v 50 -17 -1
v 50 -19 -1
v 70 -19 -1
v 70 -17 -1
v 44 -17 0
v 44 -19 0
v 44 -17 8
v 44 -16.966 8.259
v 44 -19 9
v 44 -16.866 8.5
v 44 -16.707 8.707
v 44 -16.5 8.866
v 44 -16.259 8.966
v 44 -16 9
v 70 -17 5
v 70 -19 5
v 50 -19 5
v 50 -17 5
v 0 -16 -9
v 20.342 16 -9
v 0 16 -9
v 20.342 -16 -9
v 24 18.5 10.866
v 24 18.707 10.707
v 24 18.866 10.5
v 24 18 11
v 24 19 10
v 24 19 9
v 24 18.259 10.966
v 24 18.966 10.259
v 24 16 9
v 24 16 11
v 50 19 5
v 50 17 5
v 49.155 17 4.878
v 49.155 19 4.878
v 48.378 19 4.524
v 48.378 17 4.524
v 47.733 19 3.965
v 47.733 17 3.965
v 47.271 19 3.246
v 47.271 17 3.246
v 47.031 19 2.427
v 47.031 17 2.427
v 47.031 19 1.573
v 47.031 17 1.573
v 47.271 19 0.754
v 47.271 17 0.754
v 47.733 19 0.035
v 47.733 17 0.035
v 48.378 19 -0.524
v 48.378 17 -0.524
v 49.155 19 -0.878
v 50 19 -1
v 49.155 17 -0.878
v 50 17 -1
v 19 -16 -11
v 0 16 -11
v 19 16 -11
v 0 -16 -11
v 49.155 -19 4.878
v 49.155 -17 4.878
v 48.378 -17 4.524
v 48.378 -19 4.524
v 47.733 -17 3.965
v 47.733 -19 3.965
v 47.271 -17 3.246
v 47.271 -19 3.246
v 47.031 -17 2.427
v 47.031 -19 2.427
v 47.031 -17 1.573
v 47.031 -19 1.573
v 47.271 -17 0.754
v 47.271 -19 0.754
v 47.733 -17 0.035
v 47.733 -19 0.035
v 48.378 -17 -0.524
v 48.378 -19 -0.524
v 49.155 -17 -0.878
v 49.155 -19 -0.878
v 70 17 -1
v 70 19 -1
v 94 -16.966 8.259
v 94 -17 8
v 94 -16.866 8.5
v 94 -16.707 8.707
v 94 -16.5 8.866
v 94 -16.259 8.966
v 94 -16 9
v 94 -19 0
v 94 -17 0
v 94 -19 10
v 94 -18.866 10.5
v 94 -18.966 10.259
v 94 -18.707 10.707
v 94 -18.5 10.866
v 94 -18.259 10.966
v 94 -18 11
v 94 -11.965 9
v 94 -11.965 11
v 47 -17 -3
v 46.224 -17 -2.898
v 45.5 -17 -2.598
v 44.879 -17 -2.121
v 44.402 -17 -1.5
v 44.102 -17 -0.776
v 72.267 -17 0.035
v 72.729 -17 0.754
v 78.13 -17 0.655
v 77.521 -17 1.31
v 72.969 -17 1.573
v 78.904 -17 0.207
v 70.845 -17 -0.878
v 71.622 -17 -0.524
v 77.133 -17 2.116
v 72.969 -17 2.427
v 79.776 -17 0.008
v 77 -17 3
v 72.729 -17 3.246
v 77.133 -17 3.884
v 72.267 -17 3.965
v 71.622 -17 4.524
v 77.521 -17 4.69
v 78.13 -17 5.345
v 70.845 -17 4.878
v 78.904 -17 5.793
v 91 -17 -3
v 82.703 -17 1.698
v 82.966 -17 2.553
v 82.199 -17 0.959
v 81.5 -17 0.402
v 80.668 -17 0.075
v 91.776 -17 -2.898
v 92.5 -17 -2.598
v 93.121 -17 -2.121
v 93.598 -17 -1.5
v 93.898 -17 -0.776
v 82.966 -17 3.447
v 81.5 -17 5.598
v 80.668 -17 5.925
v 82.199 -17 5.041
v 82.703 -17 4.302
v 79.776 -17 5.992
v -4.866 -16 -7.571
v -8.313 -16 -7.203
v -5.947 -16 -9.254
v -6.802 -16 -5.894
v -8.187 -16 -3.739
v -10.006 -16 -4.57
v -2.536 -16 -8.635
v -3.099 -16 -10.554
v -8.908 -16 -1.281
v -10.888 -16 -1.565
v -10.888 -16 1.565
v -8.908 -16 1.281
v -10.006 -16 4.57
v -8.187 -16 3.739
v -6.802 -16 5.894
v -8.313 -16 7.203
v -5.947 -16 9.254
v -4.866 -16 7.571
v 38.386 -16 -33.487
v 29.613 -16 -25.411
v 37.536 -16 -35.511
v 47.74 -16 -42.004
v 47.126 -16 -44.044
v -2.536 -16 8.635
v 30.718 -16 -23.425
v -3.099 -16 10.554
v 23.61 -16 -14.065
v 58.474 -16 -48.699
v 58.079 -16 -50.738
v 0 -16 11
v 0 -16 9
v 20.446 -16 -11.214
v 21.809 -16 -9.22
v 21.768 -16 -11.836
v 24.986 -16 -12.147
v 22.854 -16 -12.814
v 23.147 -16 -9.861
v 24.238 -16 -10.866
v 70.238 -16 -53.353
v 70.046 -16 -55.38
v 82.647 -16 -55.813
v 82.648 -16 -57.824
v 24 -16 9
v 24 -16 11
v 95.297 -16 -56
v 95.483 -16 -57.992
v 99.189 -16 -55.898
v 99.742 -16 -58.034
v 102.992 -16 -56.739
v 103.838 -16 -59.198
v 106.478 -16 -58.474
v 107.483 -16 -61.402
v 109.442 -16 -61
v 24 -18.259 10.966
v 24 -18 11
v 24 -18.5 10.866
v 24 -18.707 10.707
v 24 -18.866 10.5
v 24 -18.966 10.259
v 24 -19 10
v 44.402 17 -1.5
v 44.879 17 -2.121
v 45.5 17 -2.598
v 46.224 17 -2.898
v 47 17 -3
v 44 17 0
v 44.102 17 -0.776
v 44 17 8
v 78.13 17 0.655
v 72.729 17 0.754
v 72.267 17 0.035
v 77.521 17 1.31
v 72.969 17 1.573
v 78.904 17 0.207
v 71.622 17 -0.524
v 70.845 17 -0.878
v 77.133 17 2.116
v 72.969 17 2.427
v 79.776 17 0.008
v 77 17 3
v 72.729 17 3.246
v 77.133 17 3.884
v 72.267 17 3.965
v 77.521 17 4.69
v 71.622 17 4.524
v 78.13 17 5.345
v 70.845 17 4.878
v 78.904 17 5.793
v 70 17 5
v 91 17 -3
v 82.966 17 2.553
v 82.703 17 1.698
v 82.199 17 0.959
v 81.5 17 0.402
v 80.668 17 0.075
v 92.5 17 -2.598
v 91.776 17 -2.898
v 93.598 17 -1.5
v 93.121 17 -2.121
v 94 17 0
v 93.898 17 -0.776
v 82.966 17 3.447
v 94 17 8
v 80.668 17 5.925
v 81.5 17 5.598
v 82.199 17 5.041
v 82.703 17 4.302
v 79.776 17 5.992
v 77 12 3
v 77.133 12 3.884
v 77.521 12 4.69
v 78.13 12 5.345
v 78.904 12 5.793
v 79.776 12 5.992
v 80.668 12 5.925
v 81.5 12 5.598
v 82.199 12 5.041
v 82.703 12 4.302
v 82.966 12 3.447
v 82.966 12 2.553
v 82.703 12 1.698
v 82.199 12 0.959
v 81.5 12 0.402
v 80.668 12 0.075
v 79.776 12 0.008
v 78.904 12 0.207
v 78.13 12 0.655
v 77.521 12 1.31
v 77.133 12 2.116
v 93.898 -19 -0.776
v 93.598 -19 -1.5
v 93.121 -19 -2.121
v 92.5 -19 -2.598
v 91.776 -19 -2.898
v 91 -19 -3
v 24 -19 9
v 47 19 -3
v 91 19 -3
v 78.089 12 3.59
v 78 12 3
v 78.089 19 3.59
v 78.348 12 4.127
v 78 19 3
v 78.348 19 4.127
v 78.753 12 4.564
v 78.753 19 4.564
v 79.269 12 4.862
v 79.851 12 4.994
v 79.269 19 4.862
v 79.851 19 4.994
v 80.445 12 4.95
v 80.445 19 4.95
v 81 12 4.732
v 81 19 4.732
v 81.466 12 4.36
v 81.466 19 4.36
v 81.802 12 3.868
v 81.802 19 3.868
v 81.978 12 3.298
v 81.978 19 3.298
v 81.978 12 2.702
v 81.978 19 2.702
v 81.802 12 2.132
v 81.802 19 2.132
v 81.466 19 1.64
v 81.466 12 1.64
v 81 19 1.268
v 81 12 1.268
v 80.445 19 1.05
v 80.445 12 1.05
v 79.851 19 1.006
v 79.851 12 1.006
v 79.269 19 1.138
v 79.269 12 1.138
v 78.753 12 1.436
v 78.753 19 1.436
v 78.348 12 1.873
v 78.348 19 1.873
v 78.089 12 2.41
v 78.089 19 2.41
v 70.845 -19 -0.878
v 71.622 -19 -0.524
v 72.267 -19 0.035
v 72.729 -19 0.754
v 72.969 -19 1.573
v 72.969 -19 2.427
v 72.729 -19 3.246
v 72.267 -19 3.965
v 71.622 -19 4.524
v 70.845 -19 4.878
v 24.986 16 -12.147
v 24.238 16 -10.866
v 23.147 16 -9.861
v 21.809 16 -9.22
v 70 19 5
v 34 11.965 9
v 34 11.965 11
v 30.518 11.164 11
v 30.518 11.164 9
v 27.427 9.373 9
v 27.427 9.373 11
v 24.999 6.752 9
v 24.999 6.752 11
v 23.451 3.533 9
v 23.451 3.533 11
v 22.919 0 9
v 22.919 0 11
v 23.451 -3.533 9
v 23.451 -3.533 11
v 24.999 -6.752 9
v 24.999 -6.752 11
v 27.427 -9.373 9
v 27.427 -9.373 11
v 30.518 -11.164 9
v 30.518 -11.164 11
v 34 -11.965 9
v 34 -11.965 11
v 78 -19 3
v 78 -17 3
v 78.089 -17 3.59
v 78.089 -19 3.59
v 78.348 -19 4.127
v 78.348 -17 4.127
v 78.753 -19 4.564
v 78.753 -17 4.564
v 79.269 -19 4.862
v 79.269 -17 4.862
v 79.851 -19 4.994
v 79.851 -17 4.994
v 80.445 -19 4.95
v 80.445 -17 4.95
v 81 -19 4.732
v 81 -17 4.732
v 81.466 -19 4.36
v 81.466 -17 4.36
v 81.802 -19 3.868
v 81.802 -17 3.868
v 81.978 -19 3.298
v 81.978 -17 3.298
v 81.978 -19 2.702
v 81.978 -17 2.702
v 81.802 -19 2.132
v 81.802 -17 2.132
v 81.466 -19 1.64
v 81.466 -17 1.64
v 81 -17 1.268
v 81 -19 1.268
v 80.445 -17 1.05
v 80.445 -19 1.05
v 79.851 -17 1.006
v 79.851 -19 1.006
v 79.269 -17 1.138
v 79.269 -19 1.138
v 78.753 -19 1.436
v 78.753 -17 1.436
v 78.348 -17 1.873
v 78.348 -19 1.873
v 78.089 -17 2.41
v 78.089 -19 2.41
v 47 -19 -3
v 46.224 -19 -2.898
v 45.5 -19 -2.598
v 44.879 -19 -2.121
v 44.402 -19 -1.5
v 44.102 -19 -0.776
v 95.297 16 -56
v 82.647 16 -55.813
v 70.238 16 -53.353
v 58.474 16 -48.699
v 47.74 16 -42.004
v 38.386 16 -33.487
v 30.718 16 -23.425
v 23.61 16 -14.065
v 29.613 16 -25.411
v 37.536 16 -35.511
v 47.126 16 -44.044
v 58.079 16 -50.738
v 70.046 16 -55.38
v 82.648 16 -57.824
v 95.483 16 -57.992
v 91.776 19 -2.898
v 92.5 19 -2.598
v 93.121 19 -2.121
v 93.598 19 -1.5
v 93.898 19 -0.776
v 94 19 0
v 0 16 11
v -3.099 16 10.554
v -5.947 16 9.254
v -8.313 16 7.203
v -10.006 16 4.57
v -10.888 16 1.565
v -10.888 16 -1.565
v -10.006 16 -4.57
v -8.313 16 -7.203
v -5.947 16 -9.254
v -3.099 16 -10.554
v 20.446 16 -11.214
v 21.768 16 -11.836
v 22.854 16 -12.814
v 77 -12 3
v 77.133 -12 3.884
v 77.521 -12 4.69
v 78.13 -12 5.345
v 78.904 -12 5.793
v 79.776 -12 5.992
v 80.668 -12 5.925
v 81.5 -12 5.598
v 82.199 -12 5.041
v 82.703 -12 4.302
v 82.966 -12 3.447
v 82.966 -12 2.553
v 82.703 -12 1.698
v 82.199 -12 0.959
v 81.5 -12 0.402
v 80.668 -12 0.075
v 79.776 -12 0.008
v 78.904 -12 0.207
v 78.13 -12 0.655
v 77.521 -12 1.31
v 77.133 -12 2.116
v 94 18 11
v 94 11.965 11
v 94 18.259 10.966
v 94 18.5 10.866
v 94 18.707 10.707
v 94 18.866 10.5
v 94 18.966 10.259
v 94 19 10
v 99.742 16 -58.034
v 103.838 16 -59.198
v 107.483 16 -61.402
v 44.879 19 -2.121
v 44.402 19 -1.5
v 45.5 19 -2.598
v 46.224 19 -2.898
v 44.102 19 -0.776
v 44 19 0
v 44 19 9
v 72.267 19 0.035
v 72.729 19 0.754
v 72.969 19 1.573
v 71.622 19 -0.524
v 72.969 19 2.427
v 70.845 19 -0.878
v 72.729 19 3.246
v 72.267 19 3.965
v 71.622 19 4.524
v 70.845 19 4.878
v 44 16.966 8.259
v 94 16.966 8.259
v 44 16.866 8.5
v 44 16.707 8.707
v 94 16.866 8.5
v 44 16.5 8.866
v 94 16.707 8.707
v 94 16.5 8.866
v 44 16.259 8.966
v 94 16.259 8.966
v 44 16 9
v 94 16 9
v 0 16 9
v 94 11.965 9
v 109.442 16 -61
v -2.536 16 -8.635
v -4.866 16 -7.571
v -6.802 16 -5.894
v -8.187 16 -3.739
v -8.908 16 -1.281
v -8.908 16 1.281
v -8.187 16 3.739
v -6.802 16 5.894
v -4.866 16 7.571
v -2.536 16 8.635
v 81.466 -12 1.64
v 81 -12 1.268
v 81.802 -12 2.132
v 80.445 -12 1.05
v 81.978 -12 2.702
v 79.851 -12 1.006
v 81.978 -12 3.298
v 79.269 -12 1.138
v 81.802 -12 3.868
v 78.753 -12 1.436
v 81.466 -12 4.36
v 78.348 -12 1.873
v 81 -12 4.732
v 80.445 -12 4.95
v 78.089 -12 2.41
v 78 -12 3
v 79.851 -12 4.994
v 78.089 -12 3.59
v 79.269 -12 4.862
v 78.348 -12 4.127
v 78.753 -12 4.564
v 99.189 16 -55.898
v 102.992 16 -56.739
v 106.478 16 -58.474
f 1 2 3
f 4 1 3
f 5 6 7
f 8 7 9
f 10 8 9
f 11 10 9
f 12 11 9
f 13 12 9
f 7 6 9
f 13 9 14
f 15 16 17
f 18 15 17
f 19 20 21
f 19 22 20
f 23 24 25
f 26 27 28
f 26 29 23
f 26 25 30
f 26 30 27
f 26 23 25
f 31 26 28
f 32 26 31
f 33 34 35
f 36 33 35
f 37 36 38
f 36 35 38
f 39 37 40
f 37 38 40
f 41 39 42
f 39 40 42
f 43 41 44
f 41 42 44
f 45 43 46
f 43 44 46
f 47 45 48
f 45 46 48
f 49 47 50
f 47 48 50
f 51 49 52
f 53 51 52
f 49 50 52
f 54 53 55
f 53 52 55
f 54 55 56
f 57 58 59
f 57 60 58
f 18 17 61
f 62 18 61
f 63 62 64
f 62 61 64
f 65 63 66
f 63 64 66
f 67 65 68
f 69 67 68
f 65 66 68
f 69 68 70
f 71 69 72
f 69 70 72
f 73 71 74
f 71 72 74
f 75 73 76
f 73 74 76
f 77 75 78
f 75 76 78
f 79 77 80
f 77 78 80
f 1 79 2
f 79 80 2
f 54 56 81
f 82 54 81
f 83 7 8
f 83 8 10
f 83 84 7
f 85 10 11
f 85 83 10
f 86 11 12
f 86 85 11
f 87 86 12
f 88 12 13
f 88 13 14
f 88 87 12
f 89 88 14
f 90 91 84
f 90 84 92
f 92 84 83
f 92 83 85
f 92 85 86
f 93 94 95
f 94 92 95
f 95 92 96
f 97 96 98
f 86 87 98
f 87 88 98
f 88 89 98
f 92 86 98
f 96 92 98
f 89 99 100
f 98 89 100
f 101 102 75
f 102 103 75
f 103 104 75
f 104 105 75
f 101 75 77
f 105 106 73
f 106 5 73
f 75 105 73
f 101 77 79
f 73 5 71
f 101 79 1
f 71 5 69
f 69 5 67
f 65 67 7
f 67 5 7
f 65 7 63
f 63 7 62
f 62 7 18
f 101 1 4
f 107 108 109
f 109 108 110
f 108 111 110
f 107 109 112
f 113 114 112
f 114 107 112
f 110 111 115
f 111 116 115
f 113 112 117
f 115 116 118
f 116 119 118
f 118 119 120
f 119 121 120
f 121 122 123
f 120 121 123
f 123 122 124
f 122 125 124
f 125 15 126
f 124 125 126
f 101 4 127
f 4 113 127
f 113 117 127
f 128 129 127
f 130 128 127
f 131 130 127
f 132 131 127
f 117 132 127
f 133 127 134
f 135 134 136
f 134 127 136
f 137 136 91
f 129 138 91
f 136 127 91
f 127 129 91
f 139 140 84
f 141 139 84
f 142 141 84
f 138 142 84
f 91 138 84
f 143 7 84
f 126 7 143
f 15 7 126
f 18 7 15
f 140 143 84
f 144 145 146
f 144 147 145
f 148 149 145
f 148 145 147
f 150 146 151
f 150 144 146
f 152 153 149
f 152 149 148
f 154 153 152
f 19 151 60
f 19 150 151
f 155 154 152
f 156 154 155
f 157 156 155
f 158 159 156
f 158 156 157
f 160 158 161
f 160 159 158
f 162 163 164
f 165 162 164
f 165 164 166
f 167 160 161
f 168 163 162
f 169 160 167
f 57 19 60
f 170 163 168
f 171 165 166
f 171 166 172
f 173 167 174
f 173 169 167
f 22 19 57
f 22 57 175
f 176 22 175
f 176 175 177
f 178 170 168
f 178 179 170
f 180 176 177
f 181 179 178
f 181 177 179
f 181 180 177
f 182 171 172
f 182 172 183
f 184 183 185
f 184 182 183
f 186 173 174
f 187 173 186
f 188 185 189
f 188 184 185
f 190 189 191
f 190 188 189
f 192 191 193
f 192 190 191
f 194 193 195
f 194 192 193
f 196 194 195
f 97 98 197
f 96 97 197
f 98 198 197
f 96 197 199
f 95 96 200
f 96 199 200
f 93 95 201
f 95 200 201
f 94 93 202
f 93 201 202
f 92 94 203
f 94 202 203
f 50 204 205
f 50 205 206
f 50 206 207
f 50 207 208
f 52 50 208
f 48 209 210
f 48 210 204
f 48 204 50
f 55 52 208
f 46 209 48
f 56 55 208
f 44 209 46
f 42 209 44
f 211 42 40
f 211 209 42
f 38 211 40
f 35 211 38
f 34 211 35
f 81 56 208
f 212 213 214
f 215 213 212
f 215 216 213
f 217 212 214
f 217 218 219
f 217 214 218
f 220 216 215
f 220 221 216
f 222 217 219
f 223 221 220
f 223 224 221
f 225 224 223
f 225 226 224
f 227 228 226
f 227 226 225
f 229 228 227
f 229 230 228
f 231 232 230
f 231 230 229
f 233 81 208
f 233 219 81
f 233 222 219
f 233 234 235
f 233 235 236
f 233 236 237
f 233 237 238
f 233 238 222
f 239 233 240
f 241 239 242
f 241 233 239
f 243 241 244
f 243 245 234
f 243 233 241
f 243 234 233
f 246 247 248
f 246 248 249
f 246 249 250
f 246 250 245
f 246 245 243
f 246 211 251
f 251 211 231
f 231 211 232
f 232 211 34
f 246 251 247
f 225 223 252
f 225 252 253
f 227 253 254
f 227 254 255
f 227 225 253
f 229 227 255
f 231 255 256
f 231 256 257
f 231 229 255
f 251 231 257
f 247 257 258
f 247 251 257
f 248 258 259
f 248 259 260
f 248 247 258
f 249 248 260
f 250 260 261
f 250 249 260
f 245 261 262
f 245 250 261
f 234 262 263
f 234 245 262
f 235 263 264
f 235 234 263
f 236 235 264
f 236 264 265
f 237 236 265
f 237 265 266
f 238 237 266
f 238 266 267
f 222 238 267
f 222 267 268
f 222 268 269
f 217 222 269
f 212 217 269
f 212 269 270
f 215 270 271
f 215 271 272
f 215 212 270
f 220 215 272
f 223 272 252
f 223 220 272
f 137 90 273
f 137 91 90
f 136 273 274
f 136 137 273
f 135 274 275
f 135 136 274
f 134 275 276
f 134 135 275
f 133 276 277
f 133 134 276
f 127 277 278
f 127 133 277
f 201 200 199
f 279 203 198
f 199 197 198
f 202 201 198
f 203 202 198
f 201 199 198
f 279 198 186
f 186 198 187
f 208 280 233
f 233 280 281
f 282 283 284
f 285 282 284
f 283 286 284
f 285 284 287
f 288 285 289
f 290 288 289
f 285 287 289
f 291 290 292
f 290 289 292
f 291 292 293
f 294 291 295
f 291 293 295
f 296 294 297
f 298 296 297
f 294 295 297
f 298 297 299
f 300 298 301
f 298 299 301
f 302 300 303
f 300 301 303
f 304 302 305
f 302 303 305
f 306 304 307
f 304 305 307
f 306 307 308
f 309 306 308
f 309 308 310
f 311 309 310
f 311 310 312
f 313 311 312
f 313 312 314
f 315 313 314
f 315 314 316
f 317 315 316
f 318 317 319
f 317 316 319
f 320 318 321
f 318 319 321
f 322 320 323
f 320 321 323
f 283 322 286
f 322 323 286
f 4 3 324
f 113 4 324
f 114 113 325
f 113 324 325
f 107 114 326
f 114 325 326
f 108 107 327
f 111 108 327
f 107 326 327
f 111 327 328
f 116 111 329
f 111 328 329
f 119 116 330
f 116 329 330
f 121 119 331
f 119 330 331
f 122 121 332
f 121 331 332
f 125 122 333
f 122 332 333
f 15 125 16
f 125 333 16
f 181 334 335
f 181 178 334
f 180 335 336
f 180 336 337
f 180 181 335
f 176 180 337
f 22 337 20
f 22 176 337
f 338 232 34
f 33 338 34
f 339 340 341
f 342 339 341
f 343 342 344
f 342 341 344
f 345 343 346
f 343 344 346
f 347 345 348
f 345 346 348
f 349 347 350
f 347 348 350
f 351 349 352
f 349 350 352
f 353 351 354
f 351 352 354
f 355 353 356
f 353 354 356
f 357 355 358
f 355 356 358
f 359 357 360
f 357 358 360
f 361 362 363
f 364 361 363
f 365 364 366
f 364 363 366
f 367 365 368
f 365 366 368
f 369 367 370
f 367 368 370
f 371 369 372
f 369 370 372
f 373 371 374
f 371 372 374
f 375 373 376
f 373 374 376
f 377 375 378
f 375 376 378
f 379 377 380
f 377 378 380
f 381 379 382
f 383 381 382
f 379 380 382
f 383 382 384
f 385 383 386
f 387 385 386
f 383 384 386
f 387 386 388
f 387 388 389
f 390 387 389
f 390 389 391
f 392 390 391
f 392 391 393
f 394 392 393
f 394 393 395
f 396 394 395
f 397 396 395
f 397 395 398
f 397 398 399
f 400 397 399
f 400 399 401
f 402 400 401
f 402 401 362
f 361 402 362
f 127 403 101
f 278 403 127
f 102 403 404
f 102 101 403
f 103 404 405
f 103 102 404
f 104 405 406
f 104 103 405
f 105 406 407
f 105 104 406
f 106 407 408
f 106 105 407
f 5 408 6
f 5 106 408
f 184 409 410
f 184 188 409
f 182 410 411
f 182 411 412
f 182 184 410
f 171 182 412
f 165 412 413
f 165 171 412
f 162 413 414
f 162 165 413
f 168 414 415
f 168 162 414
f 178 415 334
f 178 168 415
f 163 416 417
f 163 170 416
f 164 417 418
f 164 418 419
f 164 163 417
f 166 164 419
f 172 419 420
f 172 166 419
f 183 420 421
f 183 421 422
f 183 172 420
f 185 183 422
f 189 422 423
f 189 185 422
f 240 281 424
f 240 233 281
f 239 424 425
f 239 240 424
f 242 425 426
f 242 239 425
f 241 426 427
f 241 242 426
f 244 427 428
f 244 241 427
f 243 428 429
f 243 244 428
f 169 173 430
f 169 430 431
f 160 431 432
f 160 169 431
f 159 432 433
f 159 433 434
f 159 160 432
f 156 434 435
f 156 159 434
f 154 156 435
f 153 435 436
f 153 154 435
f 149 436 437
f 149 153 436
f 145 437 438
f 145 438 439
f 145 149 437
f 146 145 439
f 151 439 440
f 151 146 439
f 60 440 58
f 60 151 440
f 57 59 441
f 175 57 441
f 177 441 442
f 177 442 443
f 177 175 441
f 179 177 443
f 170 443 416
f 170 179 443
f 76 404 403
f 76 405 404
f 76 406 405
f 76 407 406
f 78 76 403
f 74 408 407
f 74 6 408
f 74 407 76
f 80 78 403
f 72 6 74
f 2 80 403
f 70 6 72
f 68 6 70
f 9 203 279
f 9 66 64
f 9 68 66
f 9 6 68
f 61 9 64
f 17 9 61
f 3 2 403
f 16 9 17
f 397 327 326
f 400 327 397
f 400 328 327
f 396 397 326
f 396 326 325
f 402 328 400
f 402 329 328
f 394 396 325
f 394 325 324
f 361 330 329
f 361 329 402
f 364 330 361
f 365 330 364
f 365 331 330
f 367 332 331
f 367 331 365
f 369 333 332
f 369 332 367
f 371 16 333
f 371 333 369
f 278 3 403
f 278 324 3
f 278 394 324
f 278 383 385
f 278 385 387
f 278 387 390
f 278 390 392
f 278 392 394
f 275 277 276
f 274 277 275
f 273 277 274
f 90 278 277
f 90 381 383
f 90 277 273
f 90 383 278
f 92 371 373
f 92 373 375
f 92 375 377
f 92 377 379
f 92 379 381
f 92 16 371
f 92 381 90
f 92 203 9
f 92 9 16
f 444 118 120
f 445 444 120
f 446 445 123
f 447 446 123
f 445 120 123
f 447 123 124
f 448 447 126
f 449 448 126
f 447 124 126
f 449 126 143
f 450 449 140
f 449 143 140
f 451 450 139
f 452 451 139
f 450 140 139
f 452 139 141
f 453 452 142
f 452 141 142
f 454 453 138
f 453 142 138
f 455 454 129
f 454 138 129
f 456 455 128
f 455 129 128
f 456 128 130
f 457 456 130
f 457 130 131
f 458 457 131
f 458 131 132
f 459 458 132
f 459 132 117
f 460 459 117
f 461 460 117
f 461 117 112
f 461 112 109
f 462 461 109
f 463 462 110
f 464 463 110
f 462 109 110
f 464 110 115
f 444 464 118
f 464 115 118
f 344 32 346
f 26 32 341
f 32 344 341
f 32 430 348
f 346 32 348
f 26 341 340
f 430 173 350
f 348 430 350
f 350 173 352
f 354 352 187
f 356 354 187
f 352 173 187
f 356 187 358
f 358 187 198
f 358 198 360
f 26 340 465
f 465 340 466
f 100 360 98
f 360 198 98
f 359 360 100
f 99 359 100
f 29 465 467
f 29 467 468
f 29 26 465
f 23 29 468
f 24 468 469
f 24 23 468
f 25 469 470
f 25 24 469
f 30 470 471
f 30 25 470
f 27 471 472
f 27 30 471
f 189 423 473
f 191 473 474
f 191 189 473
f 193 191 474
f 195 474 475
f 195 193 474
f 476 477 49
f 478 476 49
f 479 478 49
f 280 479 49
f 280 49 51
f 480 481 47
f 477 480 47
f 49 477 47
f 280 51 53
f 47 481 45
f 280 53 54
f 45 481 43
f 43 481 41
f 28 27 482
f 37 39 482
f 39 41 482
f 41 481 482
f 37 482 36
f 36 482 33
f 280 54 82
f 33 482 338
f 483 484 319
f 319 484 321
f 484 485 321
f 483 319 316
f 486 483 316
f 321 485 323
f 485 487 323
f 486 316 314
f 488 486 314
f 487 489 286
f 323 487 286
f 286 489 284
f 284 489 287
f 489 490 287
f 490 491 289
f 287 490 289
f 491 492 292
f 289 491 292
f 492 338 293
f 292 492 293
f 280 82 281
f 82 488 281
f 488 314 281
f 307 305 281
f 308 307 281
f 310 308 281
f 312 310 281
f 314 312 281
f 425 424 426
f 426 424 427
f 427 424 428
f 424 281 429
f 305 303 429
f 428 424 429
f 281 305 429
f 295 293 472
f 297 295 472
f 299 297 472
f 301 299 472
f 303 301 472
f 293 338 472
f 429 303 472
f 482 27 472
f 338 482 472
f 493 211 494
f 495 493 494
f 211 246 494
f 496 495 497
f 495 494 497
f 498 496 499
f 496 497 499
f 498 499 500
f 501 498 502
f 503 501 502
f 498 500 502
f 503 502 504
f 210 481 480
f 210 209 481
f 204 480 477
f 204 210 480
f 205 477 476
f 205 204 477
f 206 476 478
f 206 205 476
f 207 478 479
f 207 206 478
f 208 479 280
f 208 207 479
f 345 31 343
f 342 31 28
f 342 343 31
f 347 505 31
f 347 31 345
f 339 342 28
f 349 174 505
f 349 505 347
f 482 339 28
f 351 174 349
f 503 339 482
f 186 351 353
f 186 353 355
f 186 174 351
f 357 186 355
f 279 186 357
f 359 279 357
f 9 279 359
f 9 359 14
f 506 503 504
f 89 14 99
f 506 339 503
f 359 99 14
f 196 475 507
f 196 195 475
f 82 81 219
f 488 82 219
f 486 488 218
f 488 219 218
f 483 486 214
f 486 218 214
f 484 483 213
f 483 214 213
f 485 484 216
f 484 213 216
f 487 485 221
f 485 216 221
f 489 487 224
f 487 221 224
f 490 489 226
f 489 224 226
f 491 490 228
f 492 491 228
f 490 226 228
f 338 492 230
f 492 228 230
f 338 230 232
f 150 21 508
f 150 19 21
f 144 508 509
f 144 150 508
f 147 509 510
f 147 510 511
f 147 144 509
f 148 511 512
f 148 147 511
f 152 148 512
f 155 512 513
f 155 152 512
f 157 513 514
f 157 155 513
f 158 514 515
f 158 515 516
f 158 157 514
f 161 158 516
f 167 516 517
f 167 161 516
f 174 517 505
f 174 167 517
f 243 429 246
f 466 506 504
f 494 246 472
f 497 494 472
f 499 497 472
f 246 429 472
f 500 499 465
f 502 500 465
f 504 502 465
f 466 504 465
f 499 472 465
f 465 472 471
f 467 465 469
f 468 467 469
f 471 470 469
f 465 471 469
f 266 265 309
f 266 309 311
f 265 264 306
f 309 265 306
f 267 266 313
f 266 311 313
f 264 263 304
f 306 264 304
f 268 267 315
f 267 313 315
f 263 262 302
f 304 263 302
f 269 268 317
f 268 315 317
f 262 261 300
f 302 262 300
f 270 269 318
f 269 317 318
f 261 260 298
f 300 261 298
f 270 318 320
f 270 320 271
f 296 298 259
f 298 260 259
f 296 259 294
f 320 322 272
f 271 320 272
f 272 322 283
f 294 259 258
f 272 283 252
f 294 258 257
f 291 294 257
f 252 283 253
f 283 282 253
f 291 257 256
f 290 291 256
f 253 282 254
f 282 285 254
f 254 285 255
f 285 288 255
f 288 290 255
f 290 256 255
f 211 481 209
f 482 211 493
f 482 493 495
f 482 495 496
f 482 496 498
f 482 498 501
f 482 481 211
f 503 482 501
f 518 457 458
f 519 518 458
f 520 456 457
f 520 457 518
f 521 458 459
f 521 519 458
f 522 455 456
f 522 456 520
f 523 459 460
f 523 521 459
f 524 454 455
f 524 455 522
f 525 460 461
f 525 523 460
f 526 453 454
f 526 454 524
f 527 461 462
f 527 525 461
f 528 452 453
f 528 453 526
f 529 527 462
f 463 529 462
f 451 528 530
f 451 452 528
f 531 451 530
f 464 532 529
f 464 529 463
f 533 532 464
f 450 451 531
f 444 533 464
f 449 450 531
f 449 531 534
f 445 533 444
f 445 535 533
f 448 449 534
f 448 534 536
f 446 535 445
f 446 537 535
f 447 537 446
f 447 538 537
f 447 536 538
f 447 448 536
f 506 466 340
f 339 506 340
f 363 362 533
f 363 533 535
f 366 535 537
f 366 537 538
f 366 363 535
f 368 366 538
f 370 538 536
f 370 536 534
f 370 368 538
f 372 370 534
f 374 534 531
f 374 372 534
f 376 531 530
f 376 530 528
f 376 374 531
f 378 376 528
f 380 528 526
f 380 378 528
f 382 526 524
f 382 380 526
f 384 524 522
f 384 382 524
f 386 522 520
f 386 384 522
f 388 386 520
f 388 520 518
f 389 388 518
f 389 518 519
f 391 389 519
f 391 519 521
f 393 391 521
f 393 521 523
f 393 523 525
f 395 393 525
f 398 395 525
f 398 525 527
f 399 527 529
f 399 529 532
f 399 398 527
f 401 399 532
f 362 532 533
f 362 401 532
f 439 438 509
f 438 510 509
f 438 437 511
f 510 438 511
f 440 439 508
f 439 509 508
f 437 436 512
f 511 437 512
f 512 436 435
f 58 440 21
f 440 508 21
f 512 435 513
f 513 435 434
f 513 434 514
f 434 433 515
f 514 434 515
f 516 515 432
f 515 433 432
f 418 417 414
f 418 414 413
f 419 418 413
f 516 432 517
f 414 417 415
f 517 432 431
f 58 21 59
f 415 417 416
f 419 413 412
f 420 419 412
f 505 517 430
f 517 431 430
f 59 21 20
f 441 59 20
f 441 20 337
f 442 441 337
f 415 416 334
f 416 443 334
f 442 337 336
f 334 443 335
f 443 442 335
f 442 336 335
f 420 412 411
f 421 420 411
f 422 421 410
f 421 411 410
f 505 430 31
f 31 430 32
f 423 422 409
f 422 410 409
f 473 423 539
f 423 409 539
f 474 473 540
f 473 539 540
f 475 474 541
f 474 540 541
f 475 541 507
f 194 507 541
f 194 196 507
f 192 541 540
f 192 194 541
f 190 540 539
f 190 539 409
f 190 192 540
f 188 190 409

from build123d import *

# Parameters (mm, degrees)
F1_DEPTH  = 16
F3_W      = 70
F3_H      = 3
F4_DEPTH  = 2
F5_W      = 50
F5_H      = 14
F6_DEPTH  = 2
F7_R      = 1
F10_DEPTH = 2
F12_DEPTH = 38.001
F14_D     = 4
F15_R     = 3
F15_R_2   = 2
F16_DEPTH = 5
F17_R     = 3


# Not quite as in the source:
# - a pattern or mirror of a feature is missing from the dataset's text; its kind, count and spacing are read off the source's solid


with BuildPart() as f1:
    # F0 (on Front) → F1 (new body)
    with BuildSketch(Plane.XZ):
        with BuildLine():
            ThreePointArc((0, -9), (-9, 0), (0, 9))
            Line((0, 9), (94, 9))
            Line((94, 9), (94, 11))
            Line((94, 11), (0, 11))
            ThreePointArc((0, 11), (-11, 0), (0, -11))
            Line((0, -11), (19, -11))
            ThreePointArc((19, -11), (21.7681124643, -11.8361612201), (23.6103896104, -14.064978646))
            ThreePointArc((23.6103896104, -14.064978646), (52.4527960943, -47.6352500016), (95.4829432523, -57.9915990802))
            ThreePointArc((95.4829432523, -57.9915990802), (101.8289994783, -58.4789828394), (107.4829432523, -61.4018055084))
            Line((107.4829432523, -61.4018055084), (109.4421656321, -61))
            ThreePointArc((109.4421656321, -61), (102.9917579834, -56.7391896111), (95.2965735981, -56))
            ThreePointArc((95.2965735981, -56), (52.955209083, -45.5949761441), (24.9861322889, -12.1467114099))
            ThreePointArc((24.9861322889, -12.1467114099), (23.1470623984, -9.8607704249), (20.3422845953, -9))
            Line((20.3422845953, -9), (0, -9))
        make_face()
    extrude(amount=F1_DEPTH)

    # F3 (on face) → F4 (join)
    with BuildSketch(Plane.XY.offset(11)):
        with Locations((59, -17.5)):
            Rectangle(F3_W, F3_H)
    extrude(amount=-F4_DEPTH)

    # F5 (on face) → F6 (join)
    with BuildSketch(Plane.XZ.offset(19)):
        with Locations((69, 4)):
            Rectangle(F5_W, F5_H)
    extrude(amount=-F6_DEPTH)

    # F7
    f7_edges = [f1.edges().sort_by_distance(p)[0] for p in [
        (59, -19, 11),
        (69, -17, 9),
    ]]
    fillet(f7_edges, radius=F7_R)

    # F8: F1 across plane


with BuildPart() as f1_1:
    add(f1.part)
    add(f1.part.mirror(Plane.XZ))

    # F9 (on face) → F10 (cut)
    with BuildSketch(Plane.XY.offset(11)):
        with BuildLine():
            Line((94, 11.964731734), (34, 11.964731734))
            ThreePointArc((34, 11.964731734), (22.9193446211, 0), (34, -11.964731734))
            Line((34, -11.964731734), (94, -11.964731734))
            Line((94, -11.964731734), (94, 11.964731734))
        make_face()
    extrude(amount=-F10_DEPTH, mode=Mode.SUBTRACT)

    # F11 (on face) → F12 (cut, through all)
    with BuildSketch(Plane.XZ.offset(19)):
        with BuildLine():
            ThreePointArc((50, 5), (47, 2), (50, -1))
            Line((50, -1), (70, -1))
            ThreePointArc((70, -1), (73, 2), (70, 5))
            Line((70, 5), (50, 5))
        make_face()
    extrude(amount=-F12_DEPTH, mode=Mode.SUBTRACT)

    # F14 (through all)
    with Locations(Plane.XZ.offset(19)):
        with Locations((80, 3)):
            Hole(F14_D / 2)

    # F15 (on face) → F16 (join)
    with BuildSketch(Plane(origin=(0, -17, 0), x_dir=(-1, 0, 0), z_dir=(0, 1, 0))):
        with Locations((-80, 3)):
            Circle(F15_R)
        with Locations((-80, 3)):
            Circle(F15_R_2, mode=Mode.SUBTRACT)
    f16 = extrude(amount=F16_DEPTH)

    # F16_copies: F16 across plane
    add(f16.mirror(Plane.ZX))

    # F17
    f17_edges = [f1_1.edges().sort_by_distance(p)[0] for p in [
        (44, -18, -3),
        (94, 18, -3),
        (94, -18, -3),
        (44, 18, -3),
    ]]
    fillet(f17_edges, radius=F17_R)


solid = f1_1.part
